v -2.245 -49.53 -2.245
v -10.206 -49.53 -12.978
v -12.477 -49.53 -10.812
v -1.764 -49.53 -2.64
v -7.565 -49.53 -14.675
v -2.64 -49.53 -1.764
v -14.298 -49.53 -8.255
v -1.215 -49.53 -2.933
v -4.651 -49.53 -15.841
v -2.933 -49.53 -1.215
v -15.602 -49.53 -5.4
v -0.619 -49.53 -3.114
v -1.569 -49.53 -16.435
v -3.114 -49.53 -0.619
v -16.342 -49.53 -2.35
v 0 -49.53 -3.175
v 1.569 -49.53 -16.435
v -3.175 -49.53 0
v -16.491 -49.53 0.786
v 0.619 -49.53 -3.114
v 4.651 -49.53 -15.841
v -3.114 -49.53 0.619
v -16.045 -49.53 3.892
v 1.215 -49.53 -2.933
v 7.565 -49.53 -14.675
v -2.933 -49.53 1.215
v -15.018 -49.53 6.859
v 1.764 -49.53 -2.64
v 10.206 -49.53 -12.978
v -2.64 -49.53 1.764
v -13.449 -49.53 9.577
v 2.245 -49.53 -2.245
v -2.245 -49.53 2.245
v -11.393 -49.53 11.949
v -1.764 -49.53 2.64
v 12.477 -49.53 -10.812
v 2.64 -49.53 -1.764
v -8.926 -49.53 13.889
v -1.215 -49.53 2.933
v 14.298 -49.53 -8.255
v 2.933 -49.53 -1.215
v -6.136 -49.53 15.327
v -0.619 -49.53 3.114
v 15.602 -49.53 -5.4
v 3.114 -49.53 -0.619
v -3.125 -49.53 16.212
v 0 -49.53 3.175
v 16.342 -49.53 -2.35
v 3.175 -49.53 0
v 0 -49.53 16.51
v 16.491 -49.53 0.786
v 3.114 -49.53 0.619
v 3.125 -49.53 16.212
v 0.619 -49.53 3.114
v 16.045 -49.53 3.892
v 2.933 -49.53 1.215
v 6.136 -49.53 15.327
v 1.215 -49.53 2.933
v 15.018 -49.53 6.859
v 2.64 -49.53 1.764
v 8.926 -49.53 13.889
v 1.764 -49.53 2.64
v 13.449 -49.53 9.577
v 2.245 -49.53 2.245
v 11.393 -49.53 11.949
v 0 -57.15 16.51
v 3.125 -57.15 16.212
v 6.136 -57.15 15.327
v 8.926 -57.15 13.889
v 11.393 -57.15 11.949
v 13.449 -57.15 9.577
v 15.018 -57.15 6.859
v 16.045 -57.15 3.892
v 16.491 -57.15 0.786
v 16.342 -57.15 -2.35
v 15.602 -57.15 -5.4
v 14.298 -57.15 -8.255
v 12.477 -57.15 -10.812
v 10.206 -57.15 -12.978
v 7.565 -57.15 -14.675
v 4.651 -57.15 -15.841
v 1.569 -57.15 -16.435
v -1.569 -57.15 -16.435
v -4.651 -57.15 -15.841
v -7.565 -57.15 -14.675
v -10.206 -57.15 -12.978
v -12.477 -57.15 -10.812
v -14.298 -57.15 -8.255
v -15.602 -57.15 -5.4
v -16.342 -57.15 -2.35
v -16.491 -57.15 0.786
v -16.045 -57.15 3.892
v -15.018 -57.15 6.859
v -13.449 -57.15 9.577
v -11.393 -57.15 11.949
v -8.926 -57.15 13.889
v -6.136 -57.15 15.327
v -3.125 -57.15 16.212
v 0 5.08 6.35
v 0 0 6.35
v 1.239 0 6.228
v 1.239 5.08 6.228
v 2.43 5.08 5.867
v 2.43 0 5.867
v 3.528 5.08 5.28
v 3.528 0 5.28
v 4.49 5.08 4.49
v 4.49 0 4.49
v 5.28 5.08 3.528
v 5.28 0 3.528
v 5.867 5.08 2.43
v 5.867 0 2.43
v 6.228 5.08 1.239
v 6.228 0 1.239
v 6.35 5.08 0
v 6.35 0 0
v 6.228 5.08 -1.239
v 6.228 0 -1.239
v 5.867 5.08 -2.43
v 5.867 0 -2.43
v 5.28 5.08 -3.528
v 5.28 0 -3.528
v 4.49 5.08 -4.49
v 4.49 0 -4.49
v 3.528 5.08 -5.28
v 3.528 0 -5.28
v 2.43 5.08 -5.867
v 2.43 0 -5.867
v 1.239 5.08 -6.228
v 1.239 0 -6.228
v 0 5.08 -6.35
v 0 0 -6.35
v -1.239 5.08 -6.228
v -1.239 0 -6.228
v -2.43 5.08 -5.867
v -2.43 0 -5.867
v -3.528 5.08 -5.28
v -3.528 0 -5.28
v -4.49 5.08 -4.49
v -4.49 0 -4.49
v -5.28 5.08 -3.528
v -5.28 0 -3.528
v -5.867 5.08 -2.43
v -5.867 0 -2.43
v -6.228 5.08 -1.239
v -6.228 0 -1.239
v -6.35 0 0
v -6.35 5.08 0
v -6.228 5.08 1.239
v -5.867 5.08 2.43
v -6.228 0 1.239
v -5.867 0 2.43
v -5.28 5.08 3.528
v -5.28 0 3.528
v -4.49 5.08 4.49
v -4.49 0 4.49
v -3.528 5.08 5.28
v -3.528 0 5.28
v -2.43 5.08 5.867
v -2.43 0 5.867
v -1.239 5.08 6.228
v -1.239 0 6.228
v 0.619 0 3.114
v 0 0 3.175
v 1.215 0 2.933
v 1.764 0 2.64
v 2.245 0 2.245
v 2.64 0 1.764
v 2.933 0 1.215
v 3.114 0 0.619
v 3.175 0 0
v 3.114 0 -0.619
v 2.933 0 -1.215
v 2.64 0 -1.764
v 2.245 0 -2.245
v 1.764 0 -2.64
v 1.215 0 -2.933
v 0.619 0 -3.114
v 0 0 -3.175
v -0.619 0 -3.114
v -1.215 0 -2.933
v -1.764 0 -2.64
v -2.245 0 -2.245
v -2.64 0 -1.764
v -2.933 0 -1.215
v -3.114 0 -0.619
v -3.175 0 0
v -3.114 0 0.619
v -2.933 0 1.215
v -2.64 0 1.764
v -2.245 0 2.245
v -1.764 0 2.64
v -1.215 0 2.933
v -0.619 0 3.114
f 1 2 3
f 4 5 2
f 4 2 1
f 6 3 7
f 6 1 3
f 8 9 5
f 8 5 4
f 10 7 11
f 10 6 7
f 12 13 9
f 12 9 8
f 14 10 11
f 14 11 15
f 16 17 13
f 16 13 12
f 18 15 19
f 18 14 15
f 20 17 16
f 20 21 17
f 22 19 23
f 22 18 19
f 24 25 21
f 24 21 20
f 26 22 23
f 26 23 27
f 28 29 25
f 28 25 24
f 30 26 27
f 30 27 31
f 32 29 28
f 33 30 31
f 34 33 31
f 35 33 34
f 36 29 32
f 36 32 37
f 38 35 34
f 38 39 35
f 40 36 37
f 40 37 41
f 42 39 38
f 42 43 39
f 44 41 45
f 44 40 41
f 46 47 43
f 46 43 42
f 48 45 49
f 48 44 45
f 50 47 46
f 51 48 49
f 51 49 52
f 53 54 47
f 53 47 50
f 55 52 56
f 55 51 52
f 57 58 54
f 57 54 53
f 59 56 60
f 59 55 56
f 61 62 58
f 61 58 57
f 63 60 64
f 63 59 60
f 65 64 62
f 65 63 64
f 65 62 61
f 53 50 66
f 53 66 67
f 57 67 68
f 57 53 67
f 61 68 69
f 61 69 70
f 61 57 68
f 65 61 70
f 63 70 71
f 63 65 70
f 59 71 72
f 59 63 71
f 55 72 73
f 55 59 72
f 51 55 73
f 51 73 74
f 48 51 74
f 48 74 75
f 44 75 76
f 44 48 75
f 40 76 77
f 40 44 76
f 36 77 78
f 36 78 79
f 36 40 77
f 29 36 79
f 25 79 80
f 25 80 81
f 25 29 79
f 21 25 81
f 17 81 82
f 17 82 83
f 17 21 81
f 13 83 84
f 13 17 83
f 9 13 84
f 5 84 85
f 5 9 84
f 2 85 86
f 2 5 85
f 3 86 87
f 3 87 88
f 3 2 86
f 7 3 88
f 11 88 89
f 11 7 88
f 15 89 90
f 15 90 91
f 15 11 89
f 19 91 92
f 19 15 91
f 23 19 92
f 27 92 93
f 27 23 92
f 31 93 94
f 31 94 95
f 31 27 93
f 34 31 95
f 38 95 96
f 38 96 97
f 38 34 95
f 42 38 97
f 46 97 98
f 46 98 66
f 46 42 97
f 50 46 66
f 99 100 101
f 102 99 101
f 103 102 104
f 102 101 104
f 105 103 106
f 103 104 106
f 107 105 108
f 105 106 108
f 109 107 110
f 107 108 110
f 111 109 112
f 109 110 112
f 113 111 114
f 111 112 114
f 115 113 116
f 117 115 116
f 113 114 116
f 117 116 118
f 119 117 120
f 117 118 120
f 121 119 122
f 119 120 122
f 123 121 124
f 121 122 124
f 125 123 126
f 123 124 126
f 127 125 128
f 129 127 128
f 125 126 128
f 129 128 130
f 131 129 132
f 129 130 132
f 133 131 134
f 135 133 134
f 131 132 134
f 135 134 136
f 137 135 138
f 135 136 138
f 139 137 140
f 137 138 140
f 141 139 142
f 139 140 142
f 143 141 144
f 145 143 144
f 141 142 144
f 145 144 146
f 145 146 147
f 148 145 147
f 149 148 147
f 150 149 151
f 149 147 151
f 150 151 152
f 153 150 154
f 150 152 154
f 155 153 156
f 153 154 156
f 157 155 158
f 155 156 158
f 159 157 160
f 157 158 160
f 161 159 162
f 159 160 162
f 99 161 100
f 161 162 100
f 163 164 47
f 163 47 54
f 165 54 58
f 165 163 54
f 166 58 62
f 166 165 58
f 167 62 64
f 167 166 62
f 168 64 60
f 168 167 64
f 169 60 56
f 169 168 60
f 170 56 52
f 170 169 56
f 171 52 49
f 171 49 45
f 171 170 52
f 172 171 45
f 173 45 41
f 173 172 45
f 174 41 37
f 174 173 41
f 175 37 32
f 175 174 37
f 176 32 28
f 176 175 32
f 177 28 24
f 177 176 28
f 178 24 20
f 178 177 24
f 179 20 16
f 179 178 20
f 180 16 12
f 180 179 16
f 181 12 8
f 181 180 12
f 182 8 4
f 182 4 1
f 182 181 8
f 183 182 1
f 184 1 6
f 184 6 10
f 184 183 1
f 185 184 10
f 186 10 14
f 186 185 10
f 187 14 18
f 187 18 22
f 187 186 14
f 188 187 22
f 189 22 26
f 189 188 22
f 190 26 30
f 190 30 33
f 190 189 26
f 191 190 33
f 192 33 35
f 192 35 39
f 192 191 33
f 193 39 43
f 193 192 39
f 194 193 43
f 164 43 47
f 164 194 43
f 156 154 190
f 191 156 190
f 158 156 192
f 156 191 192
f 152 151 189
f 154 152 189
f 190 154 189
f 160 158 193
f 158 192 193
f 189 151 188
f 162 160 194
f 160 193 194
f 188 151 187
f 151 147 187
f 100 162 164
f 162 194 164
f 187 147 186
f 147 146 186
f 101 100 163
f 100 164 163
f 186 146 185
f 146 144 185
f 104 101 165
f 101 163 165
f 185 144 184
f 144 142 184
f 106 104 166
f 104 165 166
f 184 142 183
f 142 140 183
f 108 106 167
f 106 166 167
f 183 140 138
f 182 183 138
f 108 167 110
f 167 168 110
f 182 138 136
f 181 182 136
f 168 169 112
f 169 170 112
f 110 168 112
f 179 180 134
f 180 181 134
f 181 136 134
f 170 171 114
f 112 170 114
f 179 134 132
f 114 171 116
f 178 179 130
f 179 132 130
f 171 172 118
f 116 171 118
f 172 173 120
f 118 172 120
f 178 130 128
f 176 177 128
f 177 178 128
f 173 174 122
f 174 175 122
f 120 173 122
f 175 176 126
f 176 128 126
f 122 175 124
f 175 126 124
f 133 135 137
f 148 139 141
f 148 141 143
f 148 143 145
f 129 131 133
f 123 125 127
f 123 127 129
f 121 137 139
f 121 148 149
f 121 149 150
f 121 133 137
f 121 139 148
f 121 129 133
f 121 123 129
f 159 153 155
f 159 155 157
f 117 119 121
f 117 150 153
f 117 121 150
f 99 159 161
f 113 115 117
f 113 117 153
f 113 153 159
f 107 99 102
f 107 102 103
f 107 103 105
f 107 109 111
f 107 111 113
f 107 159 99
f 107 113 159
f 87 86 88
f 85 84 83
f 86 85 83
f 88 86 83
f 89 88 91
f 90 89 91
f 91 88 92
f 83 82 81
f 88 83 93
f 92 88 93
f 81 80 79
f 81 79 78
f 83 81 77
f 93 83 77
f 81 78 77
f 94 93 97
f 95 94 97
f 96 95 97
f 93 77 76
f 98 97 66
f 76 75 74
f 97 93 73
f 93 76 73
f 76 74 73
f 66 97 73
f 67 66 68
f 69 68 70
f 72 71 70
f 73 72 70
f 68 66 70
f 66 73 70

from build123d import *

# Parameters (mm, degrees)
SKETCH1_R           = 6.35
SKETCH1_R_2         = 3.175
BOSS_EXTRUDE1_DEPTH = 5.08
SKETCH1_3_R         = 3.175
BOSS_EXTRUDE2_DEPTH = 49.53
BOSS_EXTRUDE3_START = -49.53
SKETCH1_4_R         = 16.51
SKETCH1_4_R_2       = 6.35
SKETCH1_4_R_3       = 3.175
BOSS_EXTRUDE3_DEPTH = 7.62


with BuildPart() as part:
    # Sketch1 → Boss-Extrude1 (new body)
    # profile 1 of 2: a face of its own
    with BuildSketch(Plane(origin=(0, 0, 0), x_dir=(1, 0, 0), z_dir=(0, 1, 0))):
        with Locations(Location((0, 0, 0), (0, 0, 270))):
            Circle(SKETCH1_R)
        Circle(SKETCH1_R_2, mode=Mode.SUBTRACT)
    # profile 2 of 2: a face of its own
    with BuildSketch(Plane(origin=(0, 0, 0), x_dir=(1, 0, 0), z_dir=(0, 1, 0))):
        Circle(SKETCH1_R_2)
    extrude(amount=BOSS_EXTRUDE1_DEPTH)

    # Sketch1<3> → Boss-Extrude2 (add)
    with BuildSketch(Plane(origin=(0, 0, 0), x_dir=(1, 0, 0), z_dir=(0, 1, 0))):
        with Locations(Location((0, 0, 0), (0, 0, 270))):
            Circle(SKETCH1_3_R)
    extrude(amount=-BOSS_EXTRUDE2_DEPTH)

    # Sketch1<4> → Boss-Extrude3 (add)
    # profile 1 of 3: a face of its own
    with BuildSketch(Plane(origin=(0, 0, 0), x_dir=(1, 0, 0), z_dir=(0, 1, 0)).offset(BOSS_EXTRUDE3_START)):
        with Locations(Location((0, 0, 0), (0, 0, 270))):
            Circle(SKETCH1_4_R)
        with Locations(Location((0, 0, 0), (0, 0, 270))):
            Circle(SKETCH1_4_R_2, mode=Mode.SUBTRACT)
    # profile 2 of 3: a face of its own
    with BuildSketch(Plane(origin=(0, 0, 0), x_dir=(1, 0, 0), z_dir=(0, 1, 0)).offset(BOSS_EXTRUDE3_START)):
        with Locations(Location((0, 0, 0), (0, 0, 270))):
            Circle(SKETCH1_4_R_2)
        with Locations(Location((0, 0, 0), (0, 0, 270))):
            Circle(SKETCH1_4_R_3, mode=Mode.SUBTRACT)
    # profile 3 of 3: a face of its own
    with BuildSketch(Plane(origin=(0, 0, 0), x_dir=(1, 0, 0), z_dir=(0, 1, 0)).offset(BOSS_EXTRUDE3_START)):
        with Locations(Location((0, 0, 0), (0, 0, 270))):
            Circle(SKETCH1_4_R_3)
    extrude(amount=-BOSS_EXTRUDE3_DEPTH)


solid = part.part
